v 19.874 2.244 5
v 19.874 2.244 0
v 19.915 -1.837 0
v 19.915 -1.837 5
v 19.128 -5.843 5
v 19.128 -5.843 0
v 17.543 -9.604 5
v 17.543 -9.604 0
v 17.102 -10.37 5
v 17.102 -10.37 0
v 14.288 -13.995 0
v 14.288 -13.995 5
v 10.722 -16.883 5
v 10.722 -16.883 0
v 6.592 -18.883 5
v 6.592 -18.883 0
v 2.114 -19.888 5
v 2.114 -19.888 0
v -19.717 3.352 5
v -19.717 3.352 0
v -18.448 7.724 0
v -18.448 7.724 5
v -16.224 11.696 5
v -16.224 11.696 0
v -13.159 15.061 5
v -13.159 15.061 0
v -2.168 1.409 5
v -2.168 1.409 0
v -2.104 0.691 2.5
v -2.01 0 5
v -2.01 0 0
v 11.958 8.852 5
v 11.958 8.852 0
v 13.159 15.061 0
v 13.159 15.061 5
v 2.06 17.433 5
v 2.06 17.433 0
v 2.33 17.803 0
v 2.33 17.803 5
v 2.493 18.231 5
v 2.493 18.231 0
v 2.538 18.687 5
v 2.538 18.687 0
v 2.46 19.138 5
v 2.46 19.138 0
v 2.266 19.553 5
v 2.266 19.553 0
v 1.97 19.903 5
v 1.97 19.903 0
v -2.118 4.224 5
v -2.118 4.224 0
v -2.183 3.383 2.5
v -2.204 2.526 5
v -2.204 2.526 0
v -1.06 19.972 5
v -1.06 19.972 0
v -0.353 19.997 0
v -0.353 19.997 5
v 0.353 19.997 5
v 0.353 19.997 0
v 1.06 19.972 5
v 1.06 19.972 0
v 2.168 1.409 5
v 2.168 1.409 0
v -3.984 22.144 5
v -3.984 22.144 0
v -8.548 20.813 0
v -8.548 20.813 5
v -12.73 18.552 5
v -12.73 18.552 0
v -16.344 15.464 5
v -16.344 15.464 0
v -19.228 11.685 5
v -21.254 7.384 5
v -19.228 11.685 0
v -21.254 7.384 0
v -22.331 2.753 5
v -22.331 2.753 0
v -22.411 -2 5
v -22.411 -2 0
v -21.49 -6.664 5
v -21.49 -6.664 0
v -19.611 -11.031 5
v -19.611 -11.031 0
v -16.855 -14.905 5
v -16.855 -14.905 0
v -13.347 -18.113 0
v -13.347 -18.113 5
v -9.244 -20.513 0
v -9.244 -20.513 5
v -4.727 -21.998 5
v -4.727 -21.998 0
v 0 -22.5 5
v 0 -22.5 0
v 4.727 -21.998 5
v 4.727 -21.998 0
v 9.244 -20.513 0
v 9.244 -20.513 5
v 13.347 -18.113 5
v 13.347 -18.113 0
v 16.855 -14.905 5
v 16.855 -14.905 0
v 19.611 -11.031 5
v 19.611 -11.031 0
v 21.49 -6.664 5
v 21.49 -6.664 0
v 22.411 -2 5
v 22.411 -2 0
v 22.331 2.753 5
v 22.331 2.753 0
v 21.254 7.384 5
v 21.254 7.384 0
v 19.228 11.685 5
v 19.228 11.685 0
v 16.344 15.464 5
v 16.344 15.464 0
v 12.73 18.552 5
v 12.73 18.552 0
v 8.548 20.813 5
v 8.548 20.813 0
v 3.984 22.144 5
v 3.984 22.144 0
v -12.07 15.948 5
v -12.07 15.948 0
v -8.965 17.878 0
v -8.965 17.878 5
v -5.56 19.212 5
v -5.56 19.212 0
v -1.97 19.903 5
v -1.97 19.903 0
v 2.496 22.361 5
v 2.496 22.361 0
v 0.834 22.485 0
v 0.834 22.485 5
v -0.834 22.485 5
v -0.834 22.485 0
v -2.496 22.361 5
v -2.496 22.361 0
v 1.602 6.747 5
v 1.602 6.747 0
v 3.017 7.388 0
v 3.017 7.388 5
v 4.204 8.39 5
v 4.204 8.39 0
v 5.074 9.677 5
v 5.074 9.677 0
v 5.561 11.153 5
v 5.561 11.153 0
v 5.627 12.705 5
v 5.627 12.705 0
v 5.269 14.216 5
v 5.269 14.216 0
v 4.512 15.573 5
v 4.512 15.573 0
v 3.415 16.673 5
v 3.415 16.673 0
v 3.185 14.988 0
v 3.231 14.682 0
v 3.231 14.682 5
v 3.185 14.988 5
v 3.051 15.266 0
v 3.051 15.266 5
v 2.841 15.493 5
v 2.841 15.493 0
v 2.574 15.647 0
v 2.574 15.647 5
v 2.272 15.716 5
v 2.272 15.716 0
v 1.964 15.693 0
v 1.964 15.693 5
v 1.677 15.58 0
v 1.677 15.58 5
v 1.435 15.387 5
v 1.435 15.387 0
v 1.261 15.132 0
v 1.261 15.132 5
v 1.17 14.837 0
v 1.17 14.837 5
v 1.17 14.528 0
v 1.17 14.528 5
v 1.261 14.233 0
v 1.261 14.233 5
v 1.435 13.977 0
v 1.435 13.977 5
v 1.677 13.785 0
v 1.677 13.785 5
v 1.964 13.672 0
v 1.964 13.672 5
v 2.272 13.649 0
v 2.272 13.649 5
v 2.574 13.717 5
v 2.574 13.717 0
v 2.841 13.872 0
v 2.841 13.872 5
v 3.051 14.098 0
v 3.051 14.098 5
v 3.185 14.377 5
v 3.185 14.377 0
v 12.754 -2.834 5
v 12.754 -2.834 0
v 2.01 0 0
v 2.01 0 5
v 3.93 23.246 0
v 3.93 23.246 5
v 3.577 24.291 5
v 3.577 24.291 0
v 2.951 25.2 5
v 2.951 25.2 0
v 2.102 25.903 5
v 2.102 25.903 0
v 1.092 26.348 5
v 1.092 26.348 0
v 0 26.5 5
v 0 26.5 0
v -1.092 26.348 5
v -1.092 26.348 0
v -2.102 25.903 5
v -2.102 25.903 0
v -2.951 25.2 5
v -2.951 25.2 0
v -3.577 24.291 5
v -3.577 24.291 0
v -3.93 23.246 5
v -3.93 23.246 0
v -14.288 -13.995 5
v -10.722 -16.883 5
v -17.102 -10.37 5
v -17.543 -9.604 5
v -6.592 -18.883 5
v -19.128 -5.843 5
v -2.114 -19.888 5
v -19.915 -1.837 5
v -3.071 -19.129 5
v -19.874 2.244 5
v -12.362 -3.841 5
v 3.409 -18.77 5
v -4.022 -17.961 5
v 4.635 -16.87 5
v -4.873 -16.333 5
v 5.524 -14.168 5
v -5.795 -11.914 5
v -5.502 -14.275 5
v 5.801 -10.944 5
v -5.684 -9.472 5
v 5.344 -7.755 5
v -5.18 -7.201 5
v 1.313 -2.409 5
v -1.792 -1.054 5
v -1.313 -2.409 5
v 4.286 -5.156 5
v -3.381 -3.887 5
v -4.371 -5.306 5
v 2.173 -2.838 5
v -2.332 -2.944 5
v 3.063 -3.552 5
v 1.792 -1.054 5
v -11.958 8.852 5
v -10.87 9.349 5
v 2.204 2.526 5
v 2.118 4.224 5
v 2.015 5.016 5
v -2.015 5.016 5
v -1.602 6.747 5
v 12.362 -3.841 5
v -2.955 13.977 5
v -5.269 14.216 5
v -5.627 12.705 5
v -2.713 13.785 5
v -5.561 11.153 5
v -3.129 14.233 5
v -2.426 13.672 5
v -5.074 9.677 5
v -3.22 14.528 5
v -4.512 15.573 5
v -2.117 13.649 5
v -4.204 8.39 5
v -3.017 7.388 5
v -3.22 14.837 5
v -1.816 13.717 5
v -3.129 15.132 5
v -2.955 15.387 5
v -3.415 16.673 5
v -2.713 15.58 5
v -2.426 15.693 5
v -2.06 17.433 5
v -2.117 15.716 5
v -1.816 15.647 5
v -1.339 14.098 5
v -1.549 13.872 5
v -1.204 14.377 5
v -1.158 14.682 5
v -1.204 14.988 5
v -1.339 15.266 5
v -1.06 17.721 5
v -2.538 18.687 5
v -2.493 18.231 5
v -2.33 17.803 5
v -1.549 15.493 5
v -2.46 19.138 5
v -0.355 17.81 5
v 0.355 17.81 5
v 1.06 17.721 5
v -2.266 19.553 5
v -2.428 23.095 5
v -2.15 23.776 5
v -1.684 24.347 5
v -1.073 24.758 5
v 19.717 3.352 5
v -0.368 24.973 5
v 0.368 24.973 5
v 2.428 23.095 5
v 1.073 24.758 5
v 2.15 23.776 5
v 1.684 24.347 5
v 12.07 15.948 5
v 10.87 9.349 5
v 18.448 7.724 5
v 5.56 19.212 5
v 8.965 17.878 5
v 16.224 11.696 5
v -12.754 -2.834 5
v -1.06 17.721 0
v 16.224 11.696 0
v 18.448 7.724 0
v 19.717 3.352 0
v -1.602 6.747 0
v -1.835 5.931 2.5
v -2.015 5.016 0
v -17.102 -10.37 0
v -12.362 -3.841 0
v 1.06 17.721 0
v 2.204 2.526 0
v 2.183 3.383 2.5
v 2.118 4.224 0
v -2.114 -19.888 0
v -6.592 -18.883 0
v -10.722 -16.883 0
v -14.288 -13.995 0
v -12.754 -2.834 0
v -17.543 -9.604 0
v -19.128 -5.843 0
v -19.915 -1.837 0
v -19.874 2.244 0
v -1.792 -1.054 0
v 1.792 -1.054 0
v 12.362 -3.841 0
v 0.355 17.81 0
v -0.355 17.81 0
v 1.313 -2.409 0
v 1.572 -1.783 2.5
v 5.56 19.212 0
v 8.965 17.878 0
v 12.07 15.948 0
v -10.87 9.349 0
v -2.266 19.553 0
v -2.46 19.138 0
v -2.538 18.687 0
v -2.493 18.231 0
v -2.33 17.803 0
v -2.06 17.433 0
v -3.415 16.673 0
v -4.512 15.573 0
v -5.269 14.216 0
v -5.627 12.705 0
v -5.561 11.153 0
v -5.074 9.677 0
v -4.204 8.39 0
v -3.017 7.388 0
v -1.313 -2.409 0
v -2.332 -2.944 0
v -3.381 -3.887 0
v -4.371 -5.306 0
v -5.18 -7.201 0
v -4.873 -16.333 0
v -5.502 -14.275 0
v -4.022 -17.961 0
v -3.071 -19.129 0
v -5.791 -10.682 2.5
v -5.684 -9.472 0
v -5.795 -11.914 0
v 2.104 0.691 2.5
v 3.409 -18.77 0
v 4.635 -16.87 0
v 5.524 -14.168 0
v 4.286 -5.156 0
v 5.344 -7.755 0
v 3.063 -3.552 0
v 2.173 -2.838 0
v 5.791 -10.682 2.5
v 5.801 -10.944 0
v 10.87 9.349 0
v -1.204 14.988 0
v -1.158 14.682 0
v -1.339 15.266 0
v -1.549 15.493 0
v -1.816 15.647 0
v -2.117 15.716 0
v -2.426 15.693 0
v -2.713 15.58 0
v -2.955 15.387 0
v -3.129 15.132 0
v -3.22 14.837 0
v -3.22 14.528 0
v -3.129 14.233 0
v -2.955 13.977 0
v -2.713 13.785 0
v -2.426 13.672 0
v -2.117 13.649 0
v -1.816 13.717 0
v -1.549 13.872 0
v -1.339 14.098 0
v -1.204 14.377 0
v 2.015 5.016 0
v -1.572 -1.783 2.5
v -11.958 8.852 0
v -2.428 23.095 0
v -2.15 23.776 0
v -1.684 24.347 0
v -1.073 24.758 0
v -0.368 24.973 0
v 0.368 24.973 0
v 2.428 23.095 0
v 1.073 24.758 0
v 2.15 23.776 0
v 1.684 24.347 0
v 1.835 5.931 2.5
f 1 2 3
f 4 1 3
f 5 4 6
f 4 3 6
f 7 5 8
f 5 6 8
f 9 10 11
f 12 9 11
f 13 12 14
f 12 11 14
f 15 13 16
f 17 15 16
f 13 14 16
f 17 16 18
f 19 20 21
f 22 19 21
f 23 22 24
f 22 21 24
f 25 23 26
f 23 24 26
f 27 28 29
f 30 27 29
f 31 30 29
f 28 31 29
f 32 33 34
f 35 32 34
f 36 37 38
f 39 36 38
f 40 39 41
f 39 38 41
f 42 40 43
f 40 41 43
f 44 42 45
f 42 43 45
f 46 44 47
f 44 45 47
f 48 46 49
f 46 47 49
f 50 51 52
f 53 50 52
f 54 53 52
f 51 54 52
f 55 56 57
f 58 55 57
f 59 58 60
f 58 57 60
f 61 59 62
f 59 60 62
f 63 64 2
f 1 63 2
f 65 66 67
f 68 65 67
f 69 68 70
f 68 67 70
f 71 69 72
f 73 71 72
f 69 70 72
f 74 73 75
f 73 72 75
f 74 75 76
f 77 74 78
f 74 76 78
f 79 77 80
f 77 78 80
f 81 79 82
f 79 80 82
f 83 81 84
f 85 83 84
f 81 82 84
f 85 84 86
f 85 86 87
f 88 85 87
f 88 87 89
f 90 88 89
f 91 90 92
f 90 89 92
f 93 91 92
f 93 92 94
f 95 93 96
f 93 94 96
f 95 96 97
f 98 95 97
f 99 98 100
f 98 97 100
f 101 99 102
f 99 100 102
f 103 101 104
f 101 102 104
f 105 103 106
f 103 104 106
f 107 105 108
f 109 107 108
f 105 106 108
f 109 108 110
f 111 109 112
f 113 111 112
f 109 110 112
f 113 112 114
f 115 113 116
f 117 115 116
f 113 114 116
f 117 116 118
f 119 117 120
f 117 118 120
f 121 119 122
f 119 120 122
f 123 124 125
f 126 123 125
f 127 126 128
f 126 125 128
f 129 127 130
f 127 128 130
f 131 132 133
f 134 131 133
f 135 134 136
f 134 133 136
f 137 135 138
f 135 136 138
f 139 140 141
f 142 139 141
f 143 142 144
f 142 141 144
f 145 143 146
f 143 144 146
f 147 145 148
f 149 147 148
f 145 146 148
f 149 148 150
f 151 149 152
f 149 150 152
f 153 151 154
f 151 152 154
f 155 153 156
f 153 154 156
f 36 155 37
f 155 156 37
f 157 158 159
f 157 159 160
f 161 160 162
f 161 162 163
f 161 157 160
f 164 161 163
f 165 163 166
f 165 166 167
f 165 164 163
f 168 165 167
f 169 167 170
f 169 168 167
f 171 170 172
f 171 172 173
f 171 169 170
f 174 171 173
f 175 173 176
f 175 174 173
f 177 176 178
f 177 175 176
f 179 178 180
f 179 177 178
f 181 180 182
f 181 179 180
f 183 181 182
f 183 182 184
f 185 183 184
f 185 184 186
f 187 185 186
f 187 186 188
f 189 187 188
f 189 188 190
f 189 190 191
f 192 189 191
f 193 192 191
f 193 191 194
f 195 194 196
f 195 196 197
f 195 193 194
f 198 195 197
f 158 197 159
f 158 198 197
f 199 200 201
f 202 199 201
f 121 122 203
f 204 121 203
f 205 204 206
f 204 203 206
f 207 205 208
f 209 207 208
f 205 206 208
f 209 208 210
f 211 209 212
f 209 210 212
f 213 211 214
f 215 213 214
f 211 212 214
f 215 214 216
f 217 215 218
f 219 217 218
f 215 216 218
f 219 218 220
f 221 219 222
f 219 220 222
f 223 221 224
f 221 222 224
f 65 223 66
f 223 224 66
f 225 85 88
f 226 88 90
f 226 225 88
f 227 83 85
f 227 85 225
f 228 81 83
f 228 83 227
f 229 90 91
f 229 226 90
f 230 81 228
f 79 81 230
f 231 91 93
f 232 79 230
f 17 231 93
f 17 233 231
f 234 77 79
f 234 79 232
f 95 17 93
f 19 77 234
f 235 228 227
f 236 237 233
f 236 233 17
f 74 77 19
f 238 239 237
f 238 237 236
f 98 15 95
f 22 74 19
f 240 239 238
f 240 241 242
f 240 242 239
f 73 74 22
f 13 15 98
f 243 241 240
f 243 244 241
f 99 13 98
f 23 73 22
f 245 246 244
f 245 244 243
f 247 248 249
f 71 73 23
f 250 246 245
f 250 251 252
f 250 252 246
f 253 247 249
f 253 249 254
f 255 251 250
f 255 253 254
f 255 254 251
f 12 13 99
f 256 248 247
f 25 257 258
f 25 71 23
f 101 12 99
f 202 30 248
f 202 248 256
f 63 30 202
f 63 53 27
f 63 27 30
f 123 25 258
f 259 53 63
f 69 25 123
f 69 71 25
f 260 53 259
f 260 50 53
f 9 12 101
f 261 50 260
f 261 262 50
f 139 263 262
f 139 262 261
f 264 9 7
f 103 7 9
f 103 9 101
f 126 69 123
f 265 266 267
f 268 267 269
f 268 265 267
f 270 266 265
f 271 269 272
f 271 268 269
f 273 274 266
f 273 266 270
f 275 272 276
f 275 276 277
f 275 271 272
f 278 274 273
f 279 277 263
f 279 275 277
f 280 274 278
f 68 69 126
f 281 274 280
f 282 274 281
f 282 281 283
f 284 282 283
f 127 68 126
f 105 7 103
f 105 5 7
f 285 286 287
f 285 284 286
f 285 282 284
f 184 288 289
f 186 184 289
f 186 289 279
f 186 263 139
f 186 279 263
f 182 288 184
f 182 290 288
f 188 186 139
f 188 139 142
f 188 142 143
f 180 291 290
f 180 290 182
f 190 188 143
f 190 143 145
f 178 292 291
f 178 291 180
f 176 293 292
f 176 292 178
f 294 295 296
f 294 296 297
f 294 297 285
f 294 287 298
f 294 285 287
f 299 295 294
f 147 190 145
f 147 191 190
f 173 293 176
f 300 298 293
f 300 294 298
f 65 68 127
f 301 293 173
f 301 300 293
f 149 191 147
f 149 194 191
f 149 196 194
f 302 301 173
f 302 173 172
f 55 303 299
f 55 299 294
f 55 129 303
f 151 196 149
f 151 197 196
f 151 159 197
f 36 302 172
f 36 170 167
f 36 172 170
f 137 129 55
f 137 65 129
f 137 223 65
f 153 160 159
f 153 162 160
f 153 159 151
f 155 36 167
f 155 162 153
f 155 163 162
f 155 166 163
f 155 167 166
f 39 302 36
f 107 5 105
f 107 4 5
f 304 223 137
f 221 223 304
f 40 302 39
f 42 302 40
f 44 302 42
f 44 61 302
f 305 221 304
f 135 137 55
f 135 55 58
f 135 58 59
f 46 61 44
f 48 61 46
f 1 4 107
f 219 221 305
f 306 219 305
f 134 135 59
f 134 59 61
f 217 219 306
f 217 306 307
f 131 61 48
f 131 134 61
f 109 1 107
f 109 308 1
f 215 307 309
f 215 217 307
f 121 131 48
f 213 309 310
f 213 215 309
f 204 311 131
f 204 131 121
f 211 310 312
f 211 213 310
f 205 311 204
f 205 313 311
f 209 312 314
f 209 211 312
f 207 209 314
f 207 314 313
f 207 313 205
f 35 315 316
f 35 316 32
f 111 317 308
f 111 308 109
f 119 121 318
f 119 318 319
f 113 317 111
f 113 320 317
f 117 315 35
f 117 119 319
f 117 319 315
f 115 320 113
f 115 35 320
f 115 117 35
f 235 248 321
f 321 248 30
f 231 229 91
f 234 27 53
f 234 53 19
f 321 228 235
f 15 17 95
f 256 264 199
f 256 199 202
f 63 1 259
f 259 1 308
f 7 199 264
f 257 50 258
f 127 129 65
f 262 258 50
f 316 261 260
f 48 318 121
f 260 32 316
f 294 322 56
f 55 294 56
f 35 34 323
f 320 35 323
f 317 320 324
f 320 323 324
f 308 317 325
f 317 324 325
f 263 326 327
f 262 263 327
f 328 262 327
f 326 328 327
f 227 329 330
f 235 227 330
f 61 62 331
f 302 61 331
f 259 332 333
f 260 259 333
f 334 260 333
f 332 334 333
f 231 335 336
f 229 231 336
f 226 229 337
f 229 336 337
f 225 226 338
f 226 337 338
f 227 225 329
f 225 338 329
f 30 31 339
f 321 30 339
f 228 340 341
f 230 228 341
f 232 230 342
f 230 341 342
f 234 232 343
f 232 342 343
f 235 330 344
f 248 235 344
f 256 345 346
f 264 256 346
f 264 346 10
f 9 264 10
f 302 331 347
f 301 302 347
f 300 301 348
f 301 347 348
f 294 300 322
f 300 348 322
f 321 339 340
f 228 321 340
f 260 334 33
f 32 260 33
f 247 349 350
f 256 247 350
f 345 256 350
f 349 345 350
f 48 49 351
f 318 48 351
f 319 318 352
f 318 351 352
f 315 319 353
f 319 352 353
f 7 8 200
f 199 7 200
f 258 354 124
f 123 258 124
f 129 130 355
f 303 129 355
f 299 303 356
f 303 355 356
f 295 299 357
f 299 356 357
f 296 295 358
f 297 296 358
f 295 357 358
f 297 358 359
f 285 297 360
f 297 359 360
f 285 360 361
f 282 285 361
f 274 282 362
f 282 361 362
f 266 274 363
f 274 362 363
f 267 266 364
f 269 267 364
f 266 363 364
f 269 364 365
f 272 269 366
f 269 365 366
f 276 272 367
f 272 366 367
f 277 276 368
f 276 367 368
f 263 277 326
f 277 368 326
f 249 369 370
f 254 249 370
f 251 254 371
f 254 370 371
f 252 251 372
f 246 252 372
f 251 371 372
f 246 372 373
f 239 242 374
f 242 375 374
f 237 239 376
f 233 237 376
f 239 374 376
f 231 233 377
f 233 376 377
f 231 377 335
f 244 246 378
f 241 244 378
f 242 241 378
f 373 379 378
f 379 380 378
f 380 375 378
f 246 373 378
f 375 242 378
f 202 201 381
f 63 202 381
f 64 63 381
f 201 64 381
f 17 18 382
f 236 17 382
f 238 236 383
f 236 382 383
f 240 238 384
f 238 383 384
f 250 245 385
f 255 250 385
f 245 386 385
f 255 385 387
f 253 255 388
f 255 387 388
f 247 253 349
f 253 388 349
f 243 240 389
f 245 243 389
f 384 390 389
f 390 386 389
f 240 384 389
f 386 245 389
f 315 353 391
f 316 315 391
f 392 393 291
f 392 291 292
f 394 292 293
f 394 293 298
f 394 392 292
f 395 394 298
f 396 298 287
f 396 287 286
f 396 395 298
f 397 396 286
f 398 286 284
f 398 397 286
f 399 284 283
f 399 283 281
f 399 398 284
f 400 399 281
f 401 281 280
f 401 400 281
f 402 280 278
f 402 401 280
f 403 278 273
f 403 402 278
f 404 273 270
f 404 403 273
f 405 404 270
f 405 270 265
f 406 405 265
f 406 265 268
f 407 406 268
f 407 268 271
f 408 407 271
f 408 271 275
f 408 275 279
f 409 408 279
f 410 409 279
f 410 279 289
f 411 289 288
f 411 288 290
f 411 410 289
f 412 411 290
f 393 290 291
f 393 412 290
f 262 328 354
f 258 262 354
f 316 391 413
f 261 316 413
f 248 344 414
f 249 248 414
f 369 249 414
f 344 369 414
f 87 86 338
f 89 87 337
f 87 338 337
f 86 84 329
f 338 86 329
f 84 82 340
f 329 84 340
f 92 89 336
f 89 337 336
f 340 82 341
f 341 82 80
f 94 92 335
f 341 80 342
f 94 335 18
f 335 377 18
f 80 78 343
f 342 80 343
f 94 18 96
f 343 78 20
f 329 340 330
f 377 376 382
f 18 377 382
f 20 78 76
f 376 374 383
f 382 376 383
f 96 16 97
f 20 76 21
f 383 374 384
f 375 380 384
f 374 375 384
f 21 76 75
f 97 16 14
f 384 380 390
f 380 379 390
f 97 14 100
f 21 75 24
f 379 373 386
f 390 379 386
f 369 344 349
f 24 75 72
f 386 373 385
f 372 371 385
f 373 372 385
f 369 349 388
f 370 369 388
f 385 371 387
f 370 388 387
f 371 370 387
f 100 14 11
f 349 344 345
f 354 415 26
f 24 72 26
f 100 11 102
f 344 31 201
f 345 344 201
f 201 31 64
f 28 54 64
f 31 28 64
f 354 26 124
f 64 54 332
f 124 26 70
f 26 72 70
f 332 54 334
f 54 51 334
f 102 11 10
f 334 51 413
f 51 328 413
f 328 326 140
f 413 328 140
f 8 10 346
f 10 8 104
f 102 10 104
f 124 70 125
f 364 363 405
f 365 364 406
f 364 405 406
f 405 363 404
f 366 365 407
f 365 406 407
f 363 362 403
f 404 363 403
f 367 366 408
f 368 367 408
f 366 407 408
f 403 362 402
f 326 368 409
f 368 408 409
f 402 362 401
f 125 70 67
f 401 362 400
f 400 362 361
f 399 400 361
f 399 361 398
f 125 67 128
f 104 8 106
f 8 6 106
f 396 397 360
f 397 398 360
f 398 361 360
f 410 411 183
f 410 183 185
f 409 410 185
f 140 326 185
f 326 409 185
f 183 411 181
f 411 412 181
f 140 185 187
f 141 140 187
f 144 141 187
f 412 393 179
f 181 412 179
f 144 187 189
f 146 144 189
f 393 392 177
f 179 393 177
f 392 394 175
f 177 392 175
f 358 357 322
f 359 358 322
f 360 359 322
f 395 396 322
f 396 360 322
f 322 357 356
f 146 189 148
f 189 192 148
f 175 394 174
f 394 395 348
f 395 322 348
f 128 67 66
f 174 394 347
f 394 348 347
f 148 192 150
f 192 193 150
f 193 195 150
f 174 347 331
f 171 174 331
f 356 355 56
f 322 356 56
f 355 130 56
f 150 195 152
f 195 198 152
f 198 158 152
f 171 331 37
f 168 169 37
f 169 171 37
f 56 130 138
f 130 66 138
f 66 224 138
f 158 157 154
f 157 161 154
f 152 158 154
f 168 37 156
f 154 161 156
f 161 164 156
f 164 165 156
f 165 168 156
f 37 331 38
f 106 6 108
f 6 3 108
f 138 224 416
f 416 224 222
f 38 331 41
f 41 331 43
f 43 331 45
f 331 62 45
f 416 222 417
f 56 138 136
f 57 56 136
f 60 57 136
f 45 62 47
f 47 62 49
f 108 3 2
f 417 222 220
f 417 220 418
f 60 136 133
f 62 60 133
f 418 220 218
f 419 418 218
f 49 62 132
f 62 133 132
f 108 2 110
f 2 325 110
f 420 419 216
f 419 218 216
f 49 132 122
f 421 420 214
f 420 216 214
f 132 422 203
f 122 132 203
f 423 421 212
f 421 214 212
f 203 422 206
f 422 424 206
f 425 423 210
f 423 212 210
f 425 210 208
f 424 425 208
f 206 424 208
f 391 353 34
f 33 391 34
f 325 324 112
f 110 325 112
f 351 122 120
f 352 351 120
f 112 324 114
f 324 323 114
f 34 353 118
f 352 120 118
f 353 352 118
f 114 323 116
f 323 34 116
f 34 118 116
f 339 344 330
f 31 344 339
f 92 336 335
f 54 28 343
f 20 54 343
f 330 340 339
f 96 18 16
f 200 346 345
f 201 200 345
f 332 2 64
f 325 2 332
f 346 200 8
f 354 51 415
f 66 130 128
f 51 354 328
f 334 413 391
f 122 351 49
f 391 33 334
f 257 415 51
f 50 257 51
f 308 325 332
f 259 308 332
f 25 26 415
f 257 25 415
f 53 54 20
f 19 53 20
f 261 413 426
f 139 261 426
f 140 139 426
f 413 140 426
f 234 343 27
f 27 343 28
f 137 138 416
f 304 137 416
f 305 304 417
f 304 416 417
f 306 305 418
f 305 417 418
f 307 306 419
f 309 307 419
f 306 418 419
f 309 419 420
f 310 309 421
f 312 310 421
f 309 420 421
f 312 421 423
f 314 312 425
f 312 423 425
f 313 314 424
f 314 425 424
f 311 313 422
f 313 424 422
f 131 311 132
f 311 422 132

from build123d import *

# Parameters (mm, degrees)
F0_R     = 1.0365074283
F1_DEPTH = 5


with BuildPart() as f1:
    # F0 (on Top) → F1 (new body)
    with BuildSketch(Plane.XY):
        with BuildLine():
            ThreePointArc((-3.9841661922, 22.1444444444), (0, -22.5), (3.9841661922, 22.1444444444))
            ThreePointArc((3.9841661922, 22.1444444444), (0, 26.5), (-3.9841661922, 22.1444444444))
        make_face()
        with BuildLine():
            Line((-12.361779034, -3.8413735326), (-1.7917317985, -1.0537330189))
            add(Edge.make_bspline(
                [(-1.7917317985, -1.0537330189), (-1.5906673745, -1.8358674236), (-1.3134624845, -2.409225668)],
                knots=[5.3341932638, 5.3341932638, 5.3341932638, 5.6448500513, 5.6448500513, 5.6448500513], degree=2, weights=[1, 0.98796078, 1]))
            add(Edge.make_bspline(
                [(-1.3134624845, -2.409225668), (-19.5695791708, -9.1070002923), (-2.1141889978, -19.8879411926)],
                knots=[0.2281836428, 0.2281836428, 0.2281836428, 2.7689132091, 2.7689132091, 2.7689132091], degree=2, weights=[1, 0.2959324485, 1]))
            ThreePointArc((-2.1141889978, -19.8879411926), (-10.722049734, -16.8830580613), (-17.1017455245, -10.3696817702))
            Line((-17.1017455245, -10.3696817702), (-12.361779034, -3.8413735326))
        make_face(mode=Mode.SUBTRACT)
        with BuildLine():
            Line((-19.8736669699, 2.2444066409), (-2.1675859993, 1.4086192827))
            add(Edge.make_bspline(
                [(-2.1675859993, 1.4086192827), (-2.1191105118, 0.6776559948), (-2.0095094668, 0)],
                knots=[4.8951971827, 4.8951971827, 4.8951971827, 5.1359653729, 5.1359653729, 5.1359653729], degree=2, weights=[1, 0.9927625817, 1]))
            Line((-2.0095094668, 0), (-12.7543099225, -2.8337282129))
            Line((-12.7543099225, -2.8337282129), (-17.5429792365, -9.6043677308))
            ThreePointArc((-17.5429792365, -9.6043677308), (-19.6239577267, -3.8600884885), (-19.8736669699, 2.2444066409))
        make_face(mode=Mode.SUBTRACT)
        with BuildLine():
            add(Edge.make_bspline(
                [(2.1141889978, -19.8879411926), (19.5695791708, -9.1070002923), (1.3134624845, -2.409225668)],
                knots=[3.5142720981, 3.5142720981, 3.5142720981, 6.0550016644, 6.0550016644, 6.0550016644], degree=2, weights=[1, 0.2959324485, 1]))
            add(Edge.make_bspline(
                [(1.3134624845, -2.409225668), (1.5906673745, -1.8358674236), (1.7917317985, -1.0537330189)],
                knots=[0.6383352558, 0.6383352558, 0.6383352558, 0.9489920434, 0.9489920434, 0.9489920434], degree=2, weights=[1, 0.98796078, 1]))
            Line((1.7917317985, -1.0537330189), (12.361779034, -3.8413735326))
            Line((12.361779034, -3.8413735326), (17.1017455245, -10.3696817702))
            ThreePointArc((17.1017455245, -10.3696817702), (10.722049734, -16.8830580613), (2.1141889978, -19.8879411926))
        make_face(mode=Mode.SUBTRACT)
        with BuildLine():
            add(Edge.make_bspline(
                [(2.0095094668, 0), (2.1191105118, 0.6776559948), (2.1675859993, 1.4086192827)],
                knots=[1.1472199343, 1.1472199343, 1.1472199343, 1.3879881245, 1.3879881245, 1.3879881245], degree=2, weights=[1, 0.9927625817, 1]))
            Line((2.1675859993, 1.4086192827), (19.8736669699, 2.2444066409))
            ThreePointArc((19.8736669699, 2.2444066409), (19.6239577267, -3.8600884885), (17.5429792365, -9.6043677308))
            Line((17.5429792365, -9.6043677308), (12.7543099225, -2.8337282129))
            Line((12.7543099225, -2.8337282129), (2.0095094668, 0))
        make_face(mode=Mode.SUBTRACT)
        with BuildLine():
            Line((-13.1589546645, 15.0612719296), (-11.9581893981, 8.8521399225))
            Line((-11.9581893981, 8.8521399225), (-2.1184332771, 4.224274002))
            add(Edge.make_bspline(
                [(-2.1184332771, 4.224274002), (-2.2043163846, 3.3918710061), (-2.2043163846, 2.5257216766)],
                knots=[4.4323282948, 4.4323282948, 4.4323282948, 4.7123889804, 4.7123889804, 4.7123889804], degree=2, weights=[1, 0.9902117616, 1]))
            Line((-2.2043163846, 2.5257216766), (-19.7170367089, 3.3523817534))
            ThreePointArc((-19.7170367089, 3.3523817534), (-17.4494191733, 9.7733193192), (-13.1589546645, 15.0612719296))
        make_face(mode=Mode.SUBTRACT)
        with BuildLine():
            ThreePointArc((-12.0695648894, 15.9475892655), (-7.2930339661, 18.6228798946), (-1.9700282112, 19.9027382249))
            ThreePointArc((-1.9700282112, 19.9027382249), (-2.5376799412, 18.6867126776), (-2.0601059912, 17.4325716407))
            ThreePointArc((-2.0601059912, 17.4325716407), (-5.6475621585, 11.9263001397), (-1.6017195104, 6.7474947888))
            add(Edge.make_bspline(
                [(-1.6017195104, 6.7474947888), (-1.8617987609, 5.9806856047), (-2.0152058244, 5.0159234701)],
                knots=[3.9549946977, 3.9549946977, 3.9549946977, 4.2951442816, 4.2951442816, 4.2951442816], degree=2, weights=[1, 0.9855721107, 1]))
            Line((-2.0152058244, 5.0159234701), (-10.8698017311, 9.3490192993))
            Line((-10.8698017311, 9.3490192993), (-12.0695648894, 15.9475892655))
        make_face(mode=Mode.SUBTRACT)
        with Locations((-2.194955945, 14.6822528914)):
            Circle(F0_R, mode=Mode.SUBTRACT)
        with BuildLine():
            ThreePointArc((-1.0600310052, 19.9718886004), (0, 20), (1.0600310052, 19.9718886004))
            Line((1.0600310052, 19.9718886004), (1.0600310052, 17.7210549676))
            ThreePointArc((1.0600310052, 17.7210549676), (0, 17.8213354129), (-1.0600310052, 17.7210549676))
            Line((-1.0600310052, 17.7210549676), (-1.0600310052, 19.9718886004))
        make_face(mode=Mode.SUBTRACT)
        with BuildLine():
            ThreePointArc((-2.4961389938, 22.3611111111), (0, 25), (2.4961389938, 22.3611111111))
            ThreePointArc((2.4961389938, 22.3611111111), (0, 22.5), (-2.4961389938, 22.3611111111))
        make_face(mode=Mode.SUBTRACT)
        with BuildLine():
            add(Edge.make_bspline(
                [(2.2043163846, 2.5257216766), (2.2043163846, 3.3918710061), (2.1184332771, 4.224274002)],
                knots=[1.5707963268, 1.5707963268, 1.5707963268, 1.8508570124, 1.8508570124, 1.8508570124], degree=2, weights=[1, 0.9902117616, 1]))
            Line((2.1184332771, 4.224274002), (11.9581893981, 8.8521399225))
            Line((11.9581893981, 8.8521399225), (13.1589546645, 15.0612719296))
            ThreePointArc((13.1589546645, 15.0612719296), (17.4494191733, 9.7733193192), (19.7170367089, 3.3523817534))
            Line((19.7170367089, 3.3523817534), (2.2043163846, 2.5257216766))
        make_face(mode=Mode.SUBTRACT)
        with BuildLine():
            add(Edge.make_bspline(
                [(2.0152058244, 5.0159234701), (1.8617987609, 5.9806856047), (1.6017195104, 6.7474947888)],
                knots=[1.9880410256, 1.9880410256, 1.9880410256, 2.3281906095, 2.3281906095, 2.3281906095], degree=2, weights=[1, 0.9855721107, 1]))
            ThreePointArc((1.6017195104, 6.7474947888), (5.6475621585, 11.9263001397), (2.0601059912, 17.4325716407))
            ThreePointArc((2.0601059912, 17.4325716407), (2.5376799412, 18.6867126776), (1.9700282112, 19.9027382249))
            ThreePointArc((1.9700282112, 19.9027382249), (7.2930339661, 18.6228798946), (12.0695648894, 15.9475892655))
            Line((12.0695648894, 15.9475892655), (10.8698017311, 9.3490192993))
            Line((10.8698017311, 9.3490192993), (2.0152058244, 5.0159234701))
        make_face(mode=Mode.SUBTRACT)
        with Locations((2.194955945, 14.6822528914)):
            Circle(F0_R, mode=Mode.SUBTRACT)
    extrude(amount=F1_DEPTH)


solid = f1.part
